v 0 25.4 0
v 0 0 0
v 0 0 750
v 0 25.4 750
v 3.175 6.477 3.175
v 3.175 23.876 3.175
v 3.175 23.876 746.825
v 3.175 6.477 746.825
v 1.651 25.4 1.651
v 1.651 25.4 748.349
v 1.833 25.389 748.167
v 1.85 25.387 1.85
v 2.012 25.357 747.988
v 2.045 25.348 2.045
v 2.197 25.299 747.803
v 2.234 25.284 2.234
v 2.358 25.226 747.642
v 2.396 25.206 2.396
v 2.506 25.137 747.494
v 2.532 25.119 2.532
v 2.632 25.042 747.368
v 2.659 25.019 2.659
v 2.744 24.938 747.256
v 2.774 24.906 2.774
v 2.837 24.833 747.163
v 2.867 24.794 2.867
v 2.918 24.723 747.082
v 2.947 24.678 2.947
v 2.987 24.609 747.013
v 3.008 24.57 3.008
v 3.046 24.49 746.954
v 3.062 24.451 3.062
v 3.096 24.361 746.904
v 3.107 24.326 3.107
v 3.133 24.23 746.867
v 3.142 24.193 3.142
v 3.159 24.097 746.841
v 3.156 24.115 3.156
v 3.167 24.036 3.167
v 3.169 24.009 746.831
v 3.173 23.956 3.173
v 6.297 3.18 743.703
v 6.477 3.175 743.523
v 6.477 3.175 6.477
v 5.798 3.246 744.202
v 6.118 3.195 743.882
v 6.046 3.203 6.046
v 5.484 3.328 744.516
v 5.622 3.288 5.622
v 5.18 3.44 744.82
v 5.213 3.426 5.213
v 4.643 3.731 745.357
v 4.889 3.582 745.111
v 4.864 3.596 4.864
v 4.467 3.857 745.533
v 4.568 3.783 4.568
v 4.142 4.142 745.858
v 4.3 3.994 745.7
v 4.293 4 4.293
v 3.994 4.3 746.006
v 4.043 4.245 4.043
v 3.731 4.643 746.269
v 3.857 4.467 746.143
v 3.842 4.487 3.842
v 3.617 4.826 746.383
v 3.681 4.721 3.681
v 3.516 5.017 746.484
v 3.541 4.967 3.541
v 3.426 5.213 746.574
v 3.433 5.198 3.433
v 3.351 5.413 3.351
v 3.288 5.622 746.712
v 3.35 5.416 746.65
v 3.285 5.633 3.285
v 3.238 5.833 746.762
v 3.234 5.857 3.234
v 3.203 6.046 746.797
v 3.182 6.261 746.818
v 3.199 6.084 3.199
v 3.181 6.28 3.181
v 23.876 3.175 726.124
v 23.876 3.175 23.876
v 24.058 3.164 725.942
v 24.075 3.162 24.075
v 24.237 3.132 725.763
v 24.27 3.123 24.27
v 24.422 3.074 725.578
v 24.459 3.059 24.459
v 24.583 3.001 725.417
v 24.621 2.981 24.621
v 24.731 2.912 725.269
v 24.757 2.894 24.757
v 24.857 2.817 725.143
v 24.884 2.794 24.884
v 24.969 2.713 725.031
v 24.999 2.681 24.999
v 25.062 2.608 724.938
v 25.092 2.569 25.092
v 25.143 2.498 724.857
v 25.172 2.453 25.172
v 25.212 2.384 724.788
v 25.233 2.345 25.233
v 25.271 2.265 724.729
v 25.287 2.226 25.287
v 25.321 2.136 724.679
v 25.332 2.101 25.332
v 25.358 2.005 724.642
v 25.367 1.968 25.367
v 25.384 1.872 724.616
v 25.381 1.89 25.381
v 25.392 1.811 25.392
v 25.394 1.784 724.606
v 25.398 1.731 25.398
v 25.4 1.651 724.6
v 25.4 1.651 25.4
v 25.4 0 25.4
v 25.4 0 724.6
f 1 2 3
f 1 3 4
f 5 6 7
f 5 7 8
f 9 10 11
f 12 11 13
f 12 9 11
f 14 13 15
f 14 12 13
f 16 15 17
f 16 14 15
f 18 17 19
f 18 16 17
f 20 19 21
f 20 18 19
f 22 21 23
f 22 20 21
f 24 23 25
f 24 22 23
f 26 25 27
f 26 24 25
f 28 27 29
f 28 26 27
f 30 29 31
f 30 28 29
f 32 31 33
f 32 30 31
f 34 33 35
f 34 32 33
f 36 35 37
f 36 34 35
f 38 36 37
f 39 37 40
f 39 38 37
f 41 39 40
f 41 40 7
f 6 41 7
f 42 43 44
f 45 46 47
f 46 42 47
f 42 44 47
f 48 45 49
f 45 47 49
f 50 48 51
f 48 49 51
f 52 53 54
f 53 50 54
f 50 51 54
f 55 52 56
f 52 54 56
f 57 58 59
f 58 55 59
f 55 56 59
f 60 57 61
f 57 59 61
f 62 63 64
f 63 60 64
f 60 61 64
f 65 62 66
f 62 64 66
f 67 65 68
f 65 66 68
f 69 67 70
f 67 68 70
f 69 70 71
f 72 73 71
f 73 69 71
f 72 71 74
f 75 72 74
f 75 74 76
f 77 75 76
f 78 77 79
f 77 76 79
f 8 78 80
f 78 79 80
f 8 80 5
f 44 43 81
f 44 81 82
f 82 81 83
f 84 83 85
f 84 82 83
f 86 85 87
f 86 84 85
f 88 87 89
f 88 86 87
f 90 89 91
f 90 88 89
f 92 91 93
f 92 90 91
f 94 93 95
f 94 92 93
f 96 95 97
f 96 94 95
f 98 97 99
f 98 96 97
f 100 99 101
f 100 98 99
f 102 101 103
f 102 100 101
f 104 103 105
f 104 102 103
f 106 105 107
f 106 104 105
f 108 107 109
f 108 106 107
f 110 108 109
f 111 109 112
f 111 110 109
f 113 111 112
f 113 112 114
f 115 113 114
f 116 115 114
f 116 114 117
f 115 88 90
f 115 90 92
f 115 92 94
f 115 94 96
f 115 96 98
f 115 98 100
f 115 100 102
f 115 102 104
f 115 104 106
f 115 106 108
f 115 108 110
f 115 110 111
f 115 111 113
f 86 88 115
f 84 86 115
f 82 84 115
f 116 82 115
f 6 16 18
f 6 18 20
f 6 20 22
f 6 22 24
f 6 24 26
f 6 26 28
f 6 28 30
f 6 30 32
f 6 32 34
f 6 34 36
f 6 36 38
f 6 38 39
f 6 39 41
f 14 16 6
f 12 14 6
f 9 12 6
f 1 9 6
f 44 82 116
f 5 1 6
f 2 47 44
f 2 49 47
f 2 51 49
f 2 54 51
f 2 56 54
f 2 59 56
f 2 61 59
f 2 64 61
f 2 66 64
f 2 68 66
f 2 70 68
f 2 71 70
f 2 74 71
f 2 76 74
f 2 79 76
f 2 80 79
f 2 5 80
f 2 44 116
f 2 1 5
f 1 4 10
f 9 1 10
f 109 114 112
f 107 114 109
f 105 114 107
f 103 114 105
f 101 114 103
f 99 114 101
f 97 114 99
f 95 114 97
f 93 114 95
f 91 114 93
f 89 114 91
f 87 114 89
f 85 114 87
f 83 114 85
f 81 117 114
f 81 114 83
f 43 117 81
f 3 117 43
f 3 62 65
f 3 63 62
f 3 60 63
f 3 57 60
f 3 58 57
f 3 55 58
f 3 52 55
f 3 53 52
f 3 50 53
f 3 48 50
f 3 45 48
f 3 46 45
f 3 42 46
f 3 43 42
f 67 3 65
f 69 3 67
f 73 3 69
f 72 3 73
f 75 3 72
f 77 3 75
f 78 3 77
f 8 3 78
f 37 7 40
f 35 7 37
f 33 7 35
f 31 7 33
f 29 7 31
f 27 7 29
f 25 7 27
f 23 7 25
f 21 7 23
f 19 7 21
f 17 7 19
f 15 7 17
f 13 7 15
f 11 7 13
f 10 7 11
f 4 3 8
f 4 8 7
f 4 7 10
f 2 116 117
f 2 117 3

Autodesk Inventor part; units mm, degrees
ref_plane "Start Plane" through (0, 0, 0) normal (0, 0, 1) x (1, 0, 0)
ref_plane "End Plane" through (0, 0, 750) normal (0, 0, 1) x (1, 0, 0)
sketch "Sketch" plane through (0, 0, 0) normal (0, 0, 1) x (1, 0, 0)
  line L0 (25.4, 0) -> (0, 0)
  line L1 (0, 0) -> (0, 25.4)
  line L2 (0, 25.4) -> (1.651, 25.4)
  line L3 (3.175, 23.876) -> (3.175, 6.477)
  line L4 (6.477, 3.175) -> (23.876, 3.175)
  line L5 (25.4, 1.651) -> (25.4, 0)
  line L6 (0, -11.0414) -> (0, 31.5385) construction
  line L7 (-11.0414, 0) -> (31.5385, 0) construction
  arc A0 (3.175, 6.477) -> (6.477, 3.175) centre (6.477, 6.477) ccw
  arc A1 (3.175, 23.876) -> (1.651, 25.4) centre (1.651, 23.876) ccw
  arc A2 (25.4, 1.651) -> (23.876, 3.175) centre (23.876, 1.651) ccw
  line L8 (0, 40.0545) -> (0, -19.5574) construction
  line L9 (-19.5574, 0) -> (40.0545, 0) construction
  point P0 (3.175, 25.4)
  point P1 (3.175, 3.175)
  point P2 (25.4, 3.175)
  dimension "d0" = 25.4
  dimension "d1" = 25.4
  dimension "d2" = 3.175
  dimension "d3" = 3.175
  dimension "d10" = 0
  dimension "d11" = 0
  dimension "d14" = 3.302
  dimension "d15" = 1.524
extrude "Body" add sketch "Sketch" along normal up to surface (750 mm away) from surface at 0
sketch "Sketch3" plane through (0, 0, 0) normal (0, 0, 1) x (1, 0, 0)
  line L0 (0, 0) -> (10, 0)
ref_plane "Work Plane3" through (0, 0, 0) normal (0, -1, 0) x (1, 0, 0)
ref_plane "Work Plane4" through (0, 12.7, 750) normal (0.7071, 0, 0.7071) x (0.7071, 0, -0.7071)
split "Split1" plane through (0, 12.7, 750) removes the side toward (0.7071, 0, 0.7071)
ref_plane "Work Plane5" through (0, 12.7, 0) normal (0.7071, 0, -0.7071) x (-0.7071, 0, -0.7071)
split "Split2" plane through (0, 12.7, 0) removes the side toward (0.7071, 0, -0.7071)
sketch "Sketch4" plane through (0, 0, 0) normal (0, -1, 0) x (1, 0, 0)
  line L0 (-2, 0) -> (12, 0) projected
  line L1 (-2, 750) -> (12, 750) projected
  dimension "d17" = 750
equation "\"d0\" = G_H"
equation "\"d1\" = G_H"
equation "\"d2\" = G_T"
equation "\"d3\" = G_T"
equation "\"d14\" = G_IR"
equation "\"d15\" = G_ER"
equation "\"d4\" = G_L"
equation "\"G_H\" = 25.4"
equation "\"G_T\" = 3.175"
equation "\"G_ER\" = 1.524"
equation "\"G_IR\" = 3.302"
equation "\"G_L\" = d17"
equation "\"ex\" = 0"
equation "\"G_OFFSET_START\" = 0"
equation "\"G_OFFSET_END\" = 0"
equation "\"d13\" = G_OFFSET_END + B_L"
equation "\"B_L\" = 750"
properties part number "AISC - L 1 x 1 x 1/8 - 29.528" material "Steel, Mild"
